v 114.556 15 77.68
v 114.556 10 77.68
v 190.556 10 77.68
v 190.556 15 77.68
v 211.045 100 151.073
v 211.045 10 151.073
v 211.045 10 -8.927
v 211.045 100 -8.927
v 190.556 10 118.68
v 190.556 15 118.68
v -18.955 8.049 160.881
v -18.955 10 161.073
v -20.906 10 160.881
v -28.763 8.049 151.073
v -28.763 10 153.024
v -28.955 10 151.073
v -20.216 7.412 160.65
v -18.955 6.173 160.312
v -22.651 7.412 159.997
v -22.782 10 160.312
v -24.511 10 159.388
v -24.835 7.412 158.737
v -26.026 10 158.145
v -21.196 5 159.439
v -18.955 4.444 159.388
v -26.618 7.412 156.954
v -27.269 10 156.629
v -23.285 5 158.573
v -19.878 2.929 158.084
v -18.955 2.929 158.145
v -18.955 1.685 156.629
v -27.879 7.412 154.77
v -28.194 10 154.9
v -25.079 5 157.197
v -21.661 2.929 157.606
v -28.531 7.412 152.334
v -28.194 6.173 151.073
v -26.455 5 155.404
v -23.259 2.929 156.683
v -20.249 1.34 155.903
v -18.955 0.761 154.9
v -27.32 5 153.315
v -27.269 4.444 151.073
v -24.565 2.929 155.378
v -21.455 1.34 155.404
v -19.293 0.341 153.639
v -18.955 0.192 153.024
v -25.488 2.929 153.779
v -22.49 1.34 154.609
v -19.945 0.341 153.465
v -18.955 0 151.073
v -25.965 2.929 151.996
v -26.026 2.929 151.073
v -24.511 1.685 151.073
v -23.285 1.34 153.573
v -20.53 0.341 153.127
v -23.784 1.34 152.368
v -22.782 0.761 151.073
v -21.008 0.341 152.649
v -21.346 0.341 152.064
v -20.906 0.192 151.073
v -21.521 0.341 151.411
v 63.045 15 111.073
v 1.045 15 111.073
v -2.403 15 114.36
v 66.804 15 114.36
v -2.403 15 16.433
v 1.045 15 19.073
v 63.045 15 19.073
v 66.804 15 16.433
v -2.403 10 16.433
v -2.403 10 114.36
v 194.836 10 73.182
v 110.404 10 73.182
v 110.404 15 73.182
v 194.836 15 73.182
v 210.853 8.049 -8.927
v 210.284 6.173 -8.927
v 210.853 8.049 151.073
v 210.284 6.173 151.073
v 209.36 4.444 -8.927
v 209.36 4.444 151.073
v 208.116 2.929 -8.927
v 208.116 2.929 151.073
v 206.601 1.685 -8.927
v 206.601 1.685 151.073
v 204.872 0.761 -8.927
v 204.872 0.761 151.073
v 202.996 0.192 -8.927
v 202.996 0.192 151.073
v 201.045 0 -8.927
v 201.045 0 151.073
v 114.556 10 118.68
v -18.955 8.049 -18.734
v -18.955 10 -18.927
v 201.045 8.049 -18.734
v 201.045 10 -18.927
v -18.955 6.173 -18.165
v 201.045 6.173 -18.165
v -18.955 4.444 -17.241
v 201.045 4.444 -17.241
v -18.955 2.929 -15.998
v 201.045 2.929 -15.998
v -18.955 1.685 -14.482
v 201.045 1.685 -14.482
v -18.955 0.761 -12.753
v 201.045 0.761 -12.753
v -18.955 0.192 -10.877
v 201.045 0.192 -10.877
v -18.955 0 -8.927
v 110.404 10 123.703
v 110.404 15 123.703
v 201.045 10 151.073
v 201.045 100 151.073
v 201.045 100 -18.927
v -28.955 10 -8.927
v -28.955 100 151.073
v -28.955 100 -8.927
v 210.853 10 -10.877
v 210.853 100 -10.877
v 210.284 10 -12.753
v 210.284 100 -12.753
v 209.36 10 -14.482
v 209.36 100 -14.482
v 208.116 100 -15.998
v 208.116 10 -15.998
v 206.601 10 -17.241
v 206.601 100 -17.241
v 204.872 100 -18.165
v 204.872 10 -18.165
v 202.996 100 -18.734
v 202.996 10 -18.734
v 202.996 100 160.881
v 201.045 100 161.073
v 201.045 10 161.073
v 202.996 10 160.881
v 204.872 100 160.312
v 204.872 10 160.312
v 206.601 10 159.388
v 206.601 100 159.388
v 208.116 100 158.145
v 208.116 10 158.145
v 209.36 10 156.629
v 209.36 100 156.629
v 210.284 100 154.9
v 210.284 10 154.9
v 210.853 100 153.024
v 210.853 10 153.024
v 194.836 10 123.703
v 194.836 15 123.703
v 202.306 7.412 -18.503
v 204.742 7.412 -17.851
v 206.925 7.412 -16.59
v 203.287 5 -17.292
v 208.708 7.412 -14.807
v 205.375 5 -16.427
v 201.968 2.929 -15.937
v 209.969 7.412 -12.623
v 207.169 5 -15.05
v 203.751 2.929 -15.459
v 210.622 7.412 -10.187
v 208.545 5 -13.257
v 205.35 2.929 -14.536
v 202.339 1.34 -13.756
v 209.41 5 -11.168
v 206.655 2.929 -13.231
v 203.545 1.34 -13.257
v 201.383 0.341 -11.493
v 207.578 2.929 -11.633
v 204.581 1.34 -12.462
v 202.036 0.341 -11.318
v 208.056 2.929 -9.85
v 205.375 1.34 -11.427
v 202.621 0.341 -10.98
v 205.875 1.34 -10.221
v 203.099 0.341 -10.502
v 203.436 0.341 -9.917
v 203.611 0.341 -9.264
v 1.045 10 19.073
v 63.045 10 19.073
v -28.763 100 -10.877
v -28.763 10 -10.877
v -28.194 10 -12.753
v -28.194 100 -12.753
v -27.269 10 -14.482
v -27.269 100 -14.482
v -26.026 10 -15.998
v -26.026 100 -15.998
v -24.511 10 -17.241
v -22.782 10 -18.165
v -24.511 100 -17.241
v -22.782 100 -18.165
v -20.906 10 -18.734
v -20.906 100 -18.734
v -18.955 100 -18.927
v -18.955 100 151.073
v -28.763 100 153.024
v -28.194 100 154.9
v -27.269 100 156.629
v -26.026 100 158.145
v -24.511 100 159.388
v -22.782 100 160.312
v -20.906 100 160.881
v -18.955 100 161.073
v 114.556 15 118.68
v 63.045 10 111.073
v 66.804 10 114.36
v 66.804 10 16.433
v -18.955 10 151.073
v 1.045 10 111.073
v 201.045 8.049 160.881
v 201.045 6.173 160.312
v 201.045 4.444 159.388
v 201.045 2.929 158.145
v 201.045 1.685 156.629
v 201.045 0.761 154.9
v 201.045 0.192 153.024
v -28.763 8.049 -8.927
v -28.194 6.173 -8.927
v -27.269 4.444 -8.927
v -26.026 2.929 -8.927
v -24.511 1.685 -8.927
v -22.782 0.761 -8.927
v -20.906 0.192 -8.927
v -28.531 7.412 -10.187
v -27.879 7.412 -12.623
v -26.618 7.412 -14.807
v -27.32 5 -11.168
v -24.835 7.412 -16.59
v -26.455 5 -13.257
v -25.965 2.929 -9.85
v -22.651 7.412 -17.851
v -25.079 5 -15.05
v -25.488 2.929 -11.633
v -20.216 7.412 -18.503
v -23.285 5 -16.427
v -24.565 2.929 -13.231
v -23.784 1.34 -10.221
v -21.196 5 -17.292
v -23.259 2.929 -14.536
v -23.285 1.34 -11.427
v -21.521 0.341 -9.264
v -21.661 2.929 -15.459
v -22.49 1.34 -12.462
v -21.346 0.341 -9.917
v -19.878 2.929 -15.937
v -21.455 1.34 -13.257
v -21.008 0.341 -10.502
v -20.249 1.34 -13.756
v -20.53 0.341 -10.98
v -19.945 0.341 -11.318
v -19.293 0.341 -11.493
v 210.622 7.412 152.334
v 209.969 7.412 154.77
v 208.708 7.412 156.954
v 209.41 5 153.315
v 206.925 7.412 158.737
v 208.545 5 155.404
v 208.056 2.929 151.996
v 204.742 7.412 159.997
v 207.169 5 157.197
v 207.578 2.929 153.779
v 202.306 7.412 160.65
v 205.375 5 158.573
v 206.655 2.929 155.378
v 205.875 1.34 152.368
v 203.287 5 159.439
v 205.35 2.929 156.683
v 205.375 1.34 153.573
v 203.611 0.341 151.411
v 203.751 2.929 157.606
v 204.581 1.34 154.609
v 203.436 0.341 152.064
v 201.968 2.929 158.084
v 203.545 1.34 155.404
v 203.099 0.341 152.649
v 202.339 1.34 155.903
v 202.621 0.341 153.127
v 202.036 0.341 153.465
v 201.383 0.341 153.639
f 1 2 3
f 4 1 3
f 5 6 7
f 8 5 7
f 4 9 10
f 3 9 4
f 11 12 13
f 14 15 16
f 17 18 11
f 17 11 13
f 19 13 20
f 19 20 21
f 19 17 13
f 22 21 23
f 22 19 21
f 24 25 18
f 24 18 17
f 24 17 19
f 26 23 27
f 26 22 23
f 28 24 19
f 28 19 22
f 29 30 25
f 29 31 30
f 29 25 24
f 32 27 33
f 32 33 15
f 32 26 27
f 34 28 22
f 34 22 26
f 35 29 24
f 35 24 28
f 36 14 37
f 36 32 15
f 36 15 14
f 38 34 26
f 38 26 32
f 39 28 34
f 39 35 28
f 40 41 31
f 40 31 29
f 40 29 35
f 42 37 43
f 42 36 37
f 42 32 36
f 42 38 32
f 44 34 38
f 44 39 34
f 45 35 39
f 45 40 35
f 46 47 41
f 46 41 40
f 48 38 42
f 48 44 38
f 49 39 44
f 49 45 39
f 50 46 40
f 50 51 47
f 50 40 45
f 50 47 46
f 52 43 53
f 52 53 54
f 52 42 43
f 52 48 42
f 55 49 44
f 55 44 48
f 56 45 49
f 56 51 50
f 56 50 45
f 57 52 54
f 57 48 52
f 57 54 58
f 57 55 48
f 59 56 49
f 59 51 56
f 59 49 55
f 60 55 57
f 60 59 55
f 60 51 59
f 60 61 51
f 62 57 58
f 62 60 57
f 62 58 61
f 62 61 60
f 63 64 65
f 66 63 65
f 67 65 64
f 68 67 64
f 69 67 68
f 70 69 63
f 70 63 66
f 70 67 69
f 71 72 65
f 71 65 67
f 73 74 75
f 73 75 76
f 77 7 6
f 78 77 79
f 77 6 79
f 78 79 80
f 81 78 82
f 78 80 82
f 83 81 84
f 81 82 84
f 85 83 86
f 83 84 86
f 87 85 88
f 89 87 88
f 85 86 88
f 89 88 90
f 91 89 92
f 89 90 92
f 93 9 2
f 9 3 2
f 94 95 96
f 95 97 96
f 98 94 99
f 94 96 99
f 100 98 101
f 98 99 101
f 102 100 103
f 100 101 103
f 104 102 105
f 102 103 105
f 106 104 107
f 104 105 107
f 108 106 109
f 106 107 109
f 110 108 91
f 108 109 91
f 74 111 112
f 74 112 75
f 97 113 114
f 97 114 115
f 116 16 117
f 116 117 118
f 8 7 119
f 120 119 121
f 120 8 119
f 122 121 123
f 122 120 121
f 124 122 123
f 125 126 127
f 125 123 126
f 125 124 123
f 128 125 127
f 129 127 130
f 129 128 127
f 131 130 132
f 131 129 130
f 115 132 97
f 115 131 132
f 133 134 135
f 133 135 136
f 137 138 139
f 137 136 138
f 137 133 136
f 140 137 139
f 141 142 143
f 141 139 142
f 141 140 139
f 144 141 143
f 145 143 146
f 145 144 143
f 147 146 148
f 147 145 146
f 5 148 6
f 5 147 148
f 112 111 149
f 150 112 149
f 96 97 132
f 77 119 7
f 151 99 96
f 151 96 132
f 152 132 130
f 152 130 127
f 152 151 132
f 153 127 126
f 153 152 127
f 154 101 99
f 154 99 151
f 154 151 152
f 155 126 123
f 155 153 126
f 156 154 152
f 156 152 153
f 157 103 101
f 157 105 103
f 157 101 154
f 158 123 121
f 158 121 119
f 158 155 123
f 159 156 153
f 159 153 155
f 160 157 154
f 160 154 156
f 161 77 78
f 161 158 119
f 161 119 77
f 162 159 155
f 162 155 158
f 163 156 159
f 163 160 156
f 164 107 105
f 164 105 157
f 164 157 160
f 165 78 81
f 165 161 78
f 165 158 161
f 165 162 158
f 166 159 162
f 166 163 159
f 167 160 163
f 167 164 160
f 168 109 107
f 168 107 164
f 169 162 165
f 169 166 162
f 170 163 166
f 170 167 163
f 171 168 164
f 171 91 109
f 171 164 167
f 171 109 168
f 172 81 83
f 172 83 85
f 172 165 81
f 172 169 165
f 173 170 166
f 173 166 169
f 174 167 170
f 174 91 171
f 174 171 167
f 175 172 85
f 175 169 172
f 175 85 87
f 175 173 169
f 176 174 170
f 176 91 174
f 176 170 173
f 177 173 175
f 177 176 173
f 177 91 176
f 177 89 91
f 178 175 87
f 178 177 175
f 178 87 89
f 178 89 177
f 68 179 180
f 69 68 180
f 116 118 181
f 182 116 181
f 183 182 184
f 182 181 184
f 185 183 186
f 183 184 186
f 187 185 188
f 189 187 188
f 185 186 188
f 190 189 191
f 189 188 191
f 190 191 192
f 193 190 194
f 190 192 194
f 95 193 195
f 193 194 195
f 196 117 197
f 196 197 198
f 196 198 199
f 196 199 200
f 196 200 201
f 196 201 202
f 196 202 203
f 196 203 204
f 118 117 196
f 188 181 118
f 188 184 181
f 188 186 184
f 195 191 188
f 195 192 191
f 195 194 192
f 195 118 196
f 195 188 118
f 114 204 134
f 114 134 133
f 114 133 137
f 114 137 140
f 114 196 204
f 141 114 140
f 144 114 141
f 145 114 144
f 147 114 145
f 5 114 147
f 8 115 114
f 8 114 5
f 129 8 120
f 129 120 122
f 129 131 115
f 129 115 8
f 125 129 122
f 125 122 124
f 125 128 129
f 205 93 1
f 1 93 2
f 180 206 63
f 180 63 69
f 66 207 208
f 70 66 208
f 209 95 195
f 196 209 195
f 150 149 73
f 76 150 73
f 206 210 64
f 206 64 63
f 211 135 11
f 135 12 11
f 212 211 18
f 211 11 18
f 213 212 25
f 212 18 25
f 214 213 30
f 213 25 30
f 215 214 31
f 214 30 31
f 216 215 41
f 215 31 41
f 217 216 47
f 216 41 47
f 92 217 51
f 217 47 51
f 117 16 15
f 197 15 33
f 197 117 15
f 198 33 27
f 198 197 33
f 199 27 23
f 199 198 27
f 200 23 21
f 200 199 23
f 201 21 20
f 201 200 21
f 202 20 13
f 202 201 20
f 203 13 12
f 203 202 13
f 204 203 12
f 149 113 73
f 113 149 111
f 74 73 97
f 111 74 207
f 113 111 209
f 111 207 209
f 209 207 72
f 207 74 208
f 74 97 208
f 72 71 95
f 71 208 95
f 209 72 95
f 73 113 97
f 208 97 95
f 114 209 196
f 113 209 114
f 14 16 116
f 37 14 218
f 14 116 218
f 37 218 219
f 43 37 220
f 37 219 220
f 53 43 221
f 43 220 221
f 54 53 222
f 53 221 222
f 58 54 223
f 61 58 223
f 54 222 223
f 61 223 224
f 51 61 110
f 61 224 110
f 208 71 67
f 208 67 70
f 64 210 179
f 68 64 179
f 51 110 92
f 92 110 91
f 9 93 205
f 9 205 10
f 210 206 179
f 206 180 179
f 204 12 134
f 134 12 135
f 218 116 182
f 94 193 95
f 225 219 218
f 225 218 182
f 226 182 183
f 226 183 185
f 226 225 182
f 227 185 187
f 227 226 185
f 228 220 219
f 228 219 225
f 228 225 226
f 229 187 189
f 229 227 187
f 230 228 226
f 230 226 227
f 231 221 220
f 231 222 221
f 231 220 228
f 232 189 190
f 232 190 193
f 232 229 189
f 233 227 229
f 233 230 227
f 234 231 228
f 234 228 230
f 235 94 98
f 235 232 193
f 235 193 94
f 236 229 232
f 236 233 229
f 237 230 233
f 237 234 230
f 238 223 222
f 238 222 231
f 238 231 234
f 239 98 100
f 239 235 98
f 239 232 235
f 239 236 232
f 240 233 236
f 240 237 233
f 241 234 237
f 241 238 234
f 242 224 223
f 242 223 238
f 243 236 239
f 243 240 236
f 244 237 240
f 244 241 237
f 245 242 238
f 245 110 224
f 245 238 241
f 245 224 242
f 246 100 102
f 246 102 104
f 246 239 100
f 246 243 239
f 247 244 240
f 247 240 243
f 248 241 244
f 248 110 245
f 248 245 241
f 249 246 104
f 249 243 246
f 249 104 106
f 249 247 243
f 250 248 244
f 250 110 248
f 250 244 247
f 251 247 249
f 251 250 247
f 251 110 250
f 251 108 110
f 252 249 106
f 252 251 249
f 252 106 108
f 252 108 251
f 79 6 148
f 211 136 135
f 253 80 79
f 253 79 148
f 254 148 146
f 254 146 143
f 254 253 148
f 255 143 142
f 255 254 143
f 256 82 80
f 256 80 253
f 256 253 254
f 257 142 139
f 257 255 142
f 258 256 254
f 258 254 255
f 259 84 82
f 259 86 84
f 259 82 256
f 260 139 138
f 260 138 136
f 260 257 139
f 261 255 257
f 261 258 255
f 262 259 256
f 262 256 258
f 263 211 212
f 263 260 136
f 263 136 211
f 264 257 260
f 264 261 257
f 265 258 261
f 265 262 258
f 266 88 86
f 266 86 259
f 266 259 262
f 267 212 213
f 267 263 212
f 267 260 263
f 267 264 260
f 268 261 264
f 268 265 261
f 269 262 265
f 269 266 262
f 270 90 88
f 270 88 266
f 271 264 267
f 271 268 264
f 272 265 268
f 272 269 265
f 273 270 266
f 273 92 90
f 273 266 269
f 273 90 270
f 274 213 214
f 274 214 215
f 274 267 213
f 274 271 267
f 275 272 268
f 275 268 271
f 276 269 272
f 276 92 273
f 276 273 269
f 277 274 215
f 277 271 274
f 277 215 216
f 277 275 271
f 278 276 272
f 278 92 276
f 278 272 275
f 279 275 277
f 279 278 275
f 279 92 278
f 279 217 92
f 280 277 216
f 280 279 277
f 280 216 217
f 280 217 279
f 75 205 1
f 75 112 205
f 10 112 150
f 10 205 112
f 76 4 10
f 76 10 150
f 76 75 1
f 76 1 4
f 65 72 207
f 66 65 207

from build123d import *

# Parameters (mm, degrees)
SKETCH2_W           = 240
SKETCH2_H           = 180
BOSS_EXTRUDE1_DEPTH = 100
SHELL1_T            = -10
FILLET3_R           = 10
FILLET4_R           = 10
SKETCH3_W           = 220
SKETCH3_H           = 90
CUT_EXTRUDE1_DEPTH  = 10
SKETCH6_W           = 69.206685732
SKETCH6_H           = 97.92746031
SKETCH6_W_2         = 62
SKETCH6_H_2         = 92
SKETCH6_W_3         = 84.432156592
SKETCH6_H_3         = 50.520880584
SKETCH6_W_4         = 76
SKETCH6_H_4         = 41
BOSS_EXTRUDE2_DEPTH = 5


with BuildPart() as part:
    # Sketch2 → Boss-Extrude1 (new body)
    with BuildSketch(Plane(origin=(0, 0, 0), x_dir=(1, 0, 0), z_dir=(0, 1, 0))):
        with Locations((91.04519774, -71.073446328)):
            Rectangle(SKETCH2_W, SKETCH2_H)
    extrude(amount=BOSS_EXTRUDE1_DEPTH)

    # Shell1
    shell1_openings = [part.faces().sort_by_distance(p)[0] for p in [
        (91.04519774, 100, 71.073446328),
    ]]
    offset(amount=SHELL1_T, openings=shell1_openings, kind=Kind.INTERSECTION)

    # Fillet3
    fillet3_edges = [part.edges().sort_by_distance(p)[0] for p in [
        (-28.95480226, 50, -18.926553672),
        (211.04519774, 50, -18.926553672),
        (211.04519774, 50, 161.073446328),
        (-28.95480226, 50, 161.073446328),
    ]]
    fillet(fillet3_edges, radius=FILLET3_R)

    # Fillet4
    fillet4_edges = [part.edges().sort_by_distance(p)[0] for p in [
        (-28.95480226, 0, 71.073446328),
        (91.04519774, 0, -18.926553672),
        (211.04519774, 0, 71.073446328),
        (91.04519774, 0, 161.073446328),
        (208.116265552, 0, 158.14451414),
        (208.116265552, 0, -15.997621484),
        (-26.025870072, 0, 158.14451414),
        (-26.025870072, 0, -15.997621484),
    ]]
    fillet(fillet4_edges, radius=FILLET4_R)

    # Sketch3 → Cut-Extrude1 (cut)
    with BuildSketch(Plane(origin=(0, 0, -18.926553672), x_dir=(-1, 0, 0), z_dir=(0, 0, -1))):
        with Locations((-91.04519774, 55)):
            Rectangle(SKETCH3_W, SKETCH3_H)
    extrude(amount=-CUT_EXTRUDE1_DEPTH, mode=Mode.SUBTRACT)

    # Sketch6 → Boss-Extrude2 (add)
    # profile 1 of 2: a face of its own
    with BuildSketch(Plane(origin=(0, 10, 0), x_dir=(1, 0, 0), z_dir=(0, 1, 0))):
        with Locations((32.200405027, -65.396277703)):
            Rectangle(SKETCH6_W, SKETCH6_H)
        with Locations((32.04519774, -65.073446328)):
            Rectangle(SKETCH6_W_2, SKETCH6_H_2, mode=Mode.SUBTRACT)
    # profile 2 of 2: a face of its own
    with BuildSketch(Plane(origin=(0, 10, 0), x_dir=(1, 0, 0), z_dir=(0, 1, 0))):
        with Locations((152.6200382, -98.44247014)):
            Rectangle(SKETCH6_W_3, SKETCH6_H_3)
        with Locations((152.556361047, -98.18046442)):
            Rectangle(SKETCH6_W_4, SKETCH6_H_4, mode=Mode.SUBTRACT)
    extrude(amount=BOSS_EXTRUDE2_DEPTH)


solid = part.part
